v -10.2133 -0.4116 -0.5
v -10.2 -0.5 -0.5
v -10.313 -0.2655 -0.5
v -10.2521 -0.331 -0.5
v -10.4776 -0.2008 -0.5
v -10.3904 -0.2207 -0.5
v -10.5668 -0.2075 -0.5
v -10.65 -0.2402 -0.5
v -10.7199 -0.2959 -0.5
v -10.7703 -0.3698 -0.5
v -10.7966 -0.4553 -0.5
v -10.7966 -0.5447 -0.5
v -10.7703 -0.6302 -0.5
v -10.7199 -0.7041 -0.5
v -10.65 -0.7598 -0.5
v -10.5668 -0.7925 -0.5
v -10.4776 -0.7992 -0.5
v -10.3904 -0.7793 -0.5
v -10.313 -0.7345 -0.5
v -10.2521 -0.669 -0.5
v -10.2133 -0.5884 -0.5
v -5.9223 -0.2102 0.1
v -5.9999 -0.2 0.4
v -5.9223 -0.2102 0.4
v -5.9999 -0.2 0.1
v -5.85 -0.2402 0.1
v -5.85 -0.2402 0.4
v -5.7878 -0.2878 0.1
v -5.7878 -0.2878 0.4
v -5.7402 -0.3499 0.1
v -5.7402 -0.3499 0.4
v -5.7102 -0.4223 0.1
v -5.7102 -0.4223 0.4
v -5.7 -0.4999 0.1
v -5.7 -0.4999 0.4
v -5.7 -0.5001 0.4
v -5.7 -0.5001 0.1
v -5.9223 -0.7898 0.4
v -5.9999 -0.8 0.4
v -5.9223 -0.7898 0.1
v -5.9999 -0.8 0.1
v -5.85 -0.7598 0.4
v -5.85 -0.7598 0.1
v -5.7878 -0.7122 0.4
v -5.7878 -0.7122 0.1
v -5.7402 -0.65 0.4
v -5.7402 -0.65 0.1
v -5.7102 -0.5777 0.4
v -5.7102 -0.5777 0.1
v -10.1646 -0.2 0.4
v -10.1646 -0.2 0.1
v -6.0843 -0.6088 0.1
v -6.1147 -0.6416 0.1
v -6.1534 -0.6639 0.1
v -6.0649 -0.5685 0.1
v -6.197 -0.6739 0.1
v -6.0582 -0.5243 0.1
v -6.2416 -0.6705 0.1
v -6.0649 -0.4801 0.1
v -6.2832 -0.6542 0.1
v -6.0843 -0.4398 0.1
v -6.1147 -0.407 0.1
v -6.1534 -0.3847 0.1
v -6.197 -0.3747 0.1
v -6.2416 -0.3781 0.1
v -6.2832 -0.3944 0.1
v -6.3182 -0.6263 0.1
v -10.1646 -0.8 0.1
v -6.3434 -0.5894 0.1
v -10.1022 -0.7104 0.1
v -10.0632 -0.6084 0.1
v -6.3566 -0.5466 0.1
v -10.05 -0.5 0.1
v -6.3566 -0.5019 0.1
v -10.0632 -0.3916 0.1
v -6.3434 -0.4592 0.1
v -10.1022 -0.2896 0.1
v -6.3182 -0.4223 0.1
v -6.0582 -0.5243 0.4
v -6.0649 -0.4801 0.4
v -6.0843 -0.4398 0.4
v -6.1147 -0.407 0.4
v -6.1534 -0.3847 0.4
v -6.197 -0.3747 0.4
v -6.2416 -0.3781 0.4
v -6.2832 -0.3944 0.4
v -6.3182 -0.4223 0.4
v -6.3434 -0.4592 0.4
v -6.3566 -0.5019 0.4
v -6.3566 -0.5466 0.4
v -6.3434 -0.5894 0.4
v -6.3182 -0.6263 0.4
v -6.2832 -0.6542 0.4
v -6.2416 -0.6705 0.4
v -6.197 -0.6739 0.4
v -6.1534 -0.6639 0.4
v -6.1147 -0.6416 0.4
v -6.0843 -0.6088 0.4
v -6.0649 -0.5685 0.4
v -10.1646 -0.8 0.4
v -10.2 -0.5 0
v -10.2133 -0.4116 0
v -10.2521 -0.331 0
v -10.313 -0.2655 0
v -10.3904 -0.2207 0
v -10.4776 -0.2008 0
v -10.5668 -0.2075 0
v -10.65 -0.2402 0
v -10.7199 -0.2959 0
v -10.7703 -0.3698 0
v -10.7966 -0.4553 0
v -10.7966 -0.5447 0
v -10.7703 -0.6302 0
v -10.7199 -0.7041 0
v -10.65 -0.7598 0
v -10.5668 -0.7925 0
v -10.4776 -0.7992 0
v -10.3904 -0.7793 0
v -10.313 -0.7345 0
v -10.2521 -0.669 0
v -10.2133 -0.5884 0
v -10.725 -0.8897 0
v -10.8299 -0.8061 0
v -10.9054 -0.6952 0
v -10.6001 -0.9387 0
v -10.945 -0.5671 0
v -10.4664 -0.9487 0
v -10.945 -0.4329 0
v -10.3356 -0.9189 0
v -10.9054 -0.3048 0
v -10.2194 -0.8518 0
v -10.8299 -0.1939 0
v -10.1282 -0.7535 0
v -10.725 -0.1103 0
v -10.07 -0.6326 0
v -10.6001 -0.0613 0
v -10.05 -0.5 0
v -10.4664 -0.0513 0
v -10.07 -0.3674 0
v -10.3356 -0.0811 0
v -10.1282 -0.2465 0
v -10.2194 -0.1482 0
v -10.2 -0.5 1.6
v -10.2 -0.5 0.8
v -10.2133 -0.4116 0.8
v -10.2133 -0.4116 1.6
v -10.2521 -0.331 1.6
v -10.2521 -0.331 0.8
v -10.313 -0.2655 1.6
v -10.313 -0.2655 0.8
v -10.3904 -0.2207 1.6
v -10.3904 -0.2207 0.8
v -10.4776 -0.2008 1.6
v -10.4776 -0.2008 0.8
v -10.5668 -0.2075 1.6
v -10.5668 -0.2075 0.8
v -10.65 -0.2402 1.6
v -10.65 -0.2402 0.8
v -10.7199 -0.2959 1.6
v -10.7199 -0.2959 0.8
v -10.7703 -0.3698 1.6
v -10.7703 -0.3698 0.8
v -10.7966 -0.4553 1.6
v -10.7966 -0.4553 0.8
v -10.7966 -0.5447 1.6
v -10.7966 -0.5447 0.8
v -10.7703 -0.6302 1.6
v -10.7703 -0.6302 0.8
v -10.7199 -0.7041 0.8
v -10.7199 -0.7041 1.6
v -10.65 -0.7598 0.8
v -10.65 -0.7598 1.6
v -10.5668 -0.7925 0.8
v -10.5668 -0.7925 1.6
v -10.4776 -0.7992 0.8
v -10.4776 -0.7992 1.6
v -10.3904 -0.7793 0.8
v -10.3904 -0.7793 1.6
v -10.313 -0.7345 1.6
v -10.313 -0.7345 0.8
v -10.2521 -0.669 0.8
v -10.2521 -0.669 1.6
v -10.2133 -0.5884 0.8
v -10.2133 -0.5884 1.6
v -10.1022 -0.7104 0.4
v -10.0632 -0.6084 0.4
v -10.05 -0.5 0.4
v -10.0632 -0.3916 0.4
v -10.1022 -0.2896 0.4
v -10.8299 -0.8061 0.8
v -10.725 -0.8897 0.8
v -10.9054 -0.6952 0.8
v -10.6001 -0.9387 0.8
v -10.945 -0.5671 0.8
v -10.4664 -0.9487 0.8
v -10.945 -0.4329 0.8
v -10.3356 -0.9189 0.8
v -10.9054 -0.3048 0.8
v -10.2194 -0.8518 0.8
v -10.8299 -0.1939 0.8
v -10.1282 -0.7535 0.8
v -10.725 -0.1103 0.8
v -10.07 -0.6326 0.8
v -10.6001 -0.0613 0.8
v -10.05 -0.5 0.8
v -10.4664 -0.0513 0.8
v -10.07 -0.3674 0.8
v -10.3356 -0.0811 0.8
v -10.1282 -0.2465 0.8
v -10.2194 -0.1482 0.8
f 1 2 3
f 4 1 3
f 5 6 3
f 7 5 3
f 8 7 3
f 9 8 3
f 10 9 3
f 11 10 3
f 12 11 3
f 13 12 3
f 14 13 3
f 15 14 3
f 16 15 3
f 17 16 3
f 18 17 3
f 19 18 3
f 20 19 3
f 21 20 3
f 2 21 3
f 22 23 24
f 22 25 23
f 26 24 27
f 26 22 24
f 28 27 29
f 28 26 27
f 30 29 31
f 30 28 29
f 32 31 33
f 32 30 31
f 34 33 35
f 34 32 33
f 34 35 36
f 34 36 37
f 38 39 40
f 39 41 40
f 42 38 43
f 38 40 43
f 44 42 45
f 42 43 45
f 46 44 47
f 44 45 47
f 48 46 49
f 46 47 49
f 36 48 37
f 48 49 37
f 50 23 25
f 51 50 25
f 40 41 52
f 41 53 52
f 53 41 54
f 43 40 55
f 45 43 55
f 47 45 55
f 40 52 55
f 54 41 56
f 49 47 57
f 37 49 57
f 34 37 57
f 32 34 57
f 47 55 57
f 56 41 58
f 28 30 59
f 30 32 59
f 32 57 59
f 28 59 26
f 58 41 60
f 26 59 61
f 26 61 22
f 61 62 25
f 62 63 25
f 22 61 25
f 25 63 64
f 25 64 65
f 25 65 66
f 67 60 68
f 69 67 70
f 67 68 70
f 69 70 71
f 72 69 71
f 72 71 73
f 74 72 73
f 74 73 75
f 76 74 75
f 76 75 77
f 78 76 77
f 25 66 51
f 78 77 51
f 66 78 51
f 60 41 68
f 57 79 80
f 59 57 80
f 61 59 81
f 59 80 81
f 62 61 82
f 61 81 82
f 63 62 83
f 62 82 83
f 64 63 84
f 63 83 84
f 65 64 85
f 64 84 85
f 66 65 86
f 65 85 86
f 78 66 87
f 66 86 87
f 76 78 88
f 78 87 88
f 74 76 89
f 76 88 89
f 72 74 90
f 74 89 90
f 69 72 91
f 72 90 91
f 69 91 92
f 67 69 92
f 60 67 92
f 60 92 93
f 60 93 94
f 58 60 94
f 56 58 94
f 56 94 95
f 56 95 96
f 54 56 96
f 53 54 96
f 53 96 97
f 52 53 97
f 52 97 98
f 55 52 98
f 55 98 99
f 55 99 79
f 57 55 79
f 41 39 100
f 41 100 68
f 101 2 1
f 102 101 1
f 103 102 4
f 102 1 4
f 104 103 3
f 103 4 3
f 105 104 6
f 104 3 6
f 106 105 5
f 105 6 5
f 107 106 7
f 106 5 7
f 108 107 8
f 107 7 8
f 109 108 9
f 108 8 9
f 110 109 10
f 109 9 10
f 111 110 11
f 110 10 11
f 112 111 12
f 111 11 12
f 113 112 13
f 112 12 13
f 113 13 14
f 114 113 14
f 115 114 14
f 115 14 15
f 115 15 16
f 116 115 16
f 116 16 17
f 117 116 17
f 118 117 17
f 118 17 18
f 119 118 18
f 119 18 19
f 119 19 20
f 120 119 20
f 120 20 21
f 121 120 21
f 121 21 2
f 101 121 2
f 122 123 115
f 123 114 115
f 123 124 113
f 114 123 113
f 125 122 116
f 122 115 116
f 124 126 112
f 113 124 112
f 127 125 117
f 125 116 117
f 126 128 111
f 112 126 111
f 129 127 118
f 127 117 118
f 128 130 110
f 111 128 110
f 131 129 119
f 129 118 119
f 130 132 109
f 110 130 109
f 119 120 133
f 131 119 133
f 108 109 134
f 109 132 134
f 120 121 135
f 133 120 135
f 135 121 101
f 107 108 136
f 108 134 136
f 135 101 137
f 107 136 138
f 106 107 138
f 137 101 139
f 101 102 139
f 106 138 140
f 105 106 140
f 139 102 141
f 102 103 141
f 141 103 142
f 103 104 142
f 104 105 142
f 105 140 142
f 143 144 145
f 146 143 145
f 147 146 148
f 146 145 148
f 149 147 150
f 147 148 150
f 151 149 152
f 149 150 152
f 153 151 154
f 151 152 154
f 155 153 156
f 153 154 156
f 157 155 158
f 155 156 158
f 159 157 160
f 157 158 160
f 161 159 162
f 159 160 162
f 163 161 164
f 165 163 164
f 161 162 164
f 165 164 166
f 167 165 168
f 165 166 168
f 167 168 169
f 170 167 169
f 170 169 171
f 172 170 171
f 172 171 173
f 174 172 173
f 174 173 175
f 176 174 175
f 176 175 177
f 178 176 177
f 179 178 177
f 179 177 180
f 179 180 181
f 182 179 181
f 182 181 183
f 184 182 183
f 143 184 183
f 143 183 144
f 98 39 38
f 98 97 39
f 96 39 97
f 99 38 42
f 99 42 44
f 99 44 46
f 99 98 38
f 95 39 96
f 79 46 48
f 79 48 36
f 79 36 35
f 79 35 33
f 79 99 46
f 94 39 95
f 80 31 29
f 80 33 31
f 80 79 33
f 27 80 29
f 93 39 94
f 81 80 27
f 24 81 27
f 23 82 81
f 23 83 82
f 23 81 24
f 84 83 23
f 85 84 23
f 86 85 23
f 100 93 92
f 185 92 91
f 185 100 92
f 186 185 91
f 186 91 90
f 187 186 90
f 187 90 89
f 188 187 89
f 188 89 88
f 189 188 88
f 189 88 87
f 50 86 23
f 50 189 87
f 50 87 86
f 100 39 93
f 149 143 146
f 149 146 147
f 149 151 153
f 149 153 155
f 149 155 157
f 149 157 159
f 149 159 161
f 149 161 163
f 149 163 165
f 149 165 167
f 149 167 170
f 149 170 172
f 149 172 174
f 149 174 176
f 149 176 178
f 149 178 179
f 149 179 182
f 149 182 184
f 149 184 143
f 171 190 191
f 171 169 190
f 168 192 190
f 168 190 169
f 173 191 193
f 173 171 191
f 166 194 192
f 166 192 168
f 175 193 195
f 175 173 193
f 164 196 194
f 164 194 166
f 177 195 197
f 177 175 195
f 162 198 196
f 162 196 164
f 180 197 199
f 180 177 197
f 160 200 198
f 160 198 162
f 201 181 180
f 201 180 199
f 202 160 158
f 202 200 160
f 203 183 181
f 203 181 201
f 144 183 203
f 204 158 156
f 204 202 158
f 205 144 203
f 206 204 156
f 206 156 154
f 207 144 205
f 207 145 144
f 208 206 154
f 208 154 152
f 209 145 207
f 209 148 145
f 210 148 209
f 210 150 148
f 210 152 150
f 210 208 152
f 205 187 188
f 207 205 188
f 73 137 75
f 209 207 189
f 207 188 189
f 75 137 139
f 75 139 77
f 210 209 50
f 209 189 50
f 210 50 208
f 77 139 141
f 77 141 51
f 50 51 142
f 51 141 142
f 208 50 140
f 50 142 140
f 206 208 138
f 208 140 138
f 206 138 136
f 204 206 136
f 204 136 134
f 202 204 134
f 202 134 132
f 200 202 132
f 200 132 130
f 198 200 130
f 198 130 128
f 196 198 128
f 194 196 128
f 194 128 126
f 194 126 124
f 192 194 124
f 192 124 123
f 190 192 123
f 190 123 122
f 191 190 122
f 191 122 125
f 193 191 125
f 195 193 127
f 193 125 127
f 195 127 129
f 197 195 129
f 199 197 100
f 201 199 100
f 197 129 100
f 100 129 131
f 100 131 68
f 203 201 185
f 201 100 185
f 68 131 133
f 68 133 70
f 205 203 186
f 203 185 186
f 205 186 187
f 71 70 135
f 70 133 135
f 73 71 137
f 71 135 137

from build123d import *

# Parameters (mm, degrees)
SKETCH_1_R           = 0.45
SKETCH_1_R_2         = 0.3
EXTRUDE_1_DEPTH      = 0.8
SKETCH_3_W           = 0.3
SKETCH_3_H           = 0.6
EXTRUDE_4_DEPTH      = 4.5
SKETCH_7_R           = 0.15
CUT_EXTRUDE_3_DEPTH  = 4.5
FILLET_1_R           = 0.3
EXTRUDE_5_DEPTH      = 0.8
EXTRUDE_5_DEPTH_BACK = 1.3
SKETCH_8_R           = 0.3


with BuildPart() as part:
    # 草图1 → 凸台-拉伸1 (new body)
    with BuildSketch(Plane.XY):
        with Locations((-10.5, -0.5)):
            Circle(SKETCH_1_R)
        with Locations((-10.5, -0.5)):
            Circle(SKETCH_1_R_2, mode=Mode.SUBTRACT)
    extrude(amount=EXTRUDE_1_DEPTH)

    # 草图3 → 凸台-拉伸4 (add)
    with BuildSketch(Plane(origin=(-10.2, -0.5, 0.8), x_dir=(0, 0, -1), z_dir=(1, 0, 0))):
        with Locations((0.55, 0)):
            Rectangle(SKETCH_3_W, SKETCH_3_H)
    extrude(amount=EXTRUDE_4_DEPTH)

    # 草图7 → 切除-拉伸3 (cut)
    with BuildSketch(Plane.XY.offset(0.4)):
        with Locations((-6.208225563, -0.524292894)):
            Circle(SKETCH_7_R)
    extrude(amount=-CUT_EXTRUDE_3_DEPTH, mode=Mode.SUBTRACT)

    # 圆角1
    fillet_1_edges = [part.edges().sort_by_distance(p)[0] for p in [
        (-5.7, -0.8, 0.25),
        (-5.7, -0.2, 0.25),
    ]]
    fillet(fillet_1_edges, radius=FILLET_1_R - 0.0001)  # a hair under: the kernel refuses the full size

    # 草图8 → 凸台-拉伸5 (add, two sides: drawn at the far end of the back side and taken through both)
    with BuildSketch(Plane.XY.offset(0.8).offset(-EXTRUDE_5_DEPTH_BACK)):
        with Locations((-10.5, -0.5)):
            Circle(SKETCH_8_R)
    extrude(amount=EXTRUDE_5_DEPTH + EXTRUDE_5_DEPTH_BACK)


solid = part.part
